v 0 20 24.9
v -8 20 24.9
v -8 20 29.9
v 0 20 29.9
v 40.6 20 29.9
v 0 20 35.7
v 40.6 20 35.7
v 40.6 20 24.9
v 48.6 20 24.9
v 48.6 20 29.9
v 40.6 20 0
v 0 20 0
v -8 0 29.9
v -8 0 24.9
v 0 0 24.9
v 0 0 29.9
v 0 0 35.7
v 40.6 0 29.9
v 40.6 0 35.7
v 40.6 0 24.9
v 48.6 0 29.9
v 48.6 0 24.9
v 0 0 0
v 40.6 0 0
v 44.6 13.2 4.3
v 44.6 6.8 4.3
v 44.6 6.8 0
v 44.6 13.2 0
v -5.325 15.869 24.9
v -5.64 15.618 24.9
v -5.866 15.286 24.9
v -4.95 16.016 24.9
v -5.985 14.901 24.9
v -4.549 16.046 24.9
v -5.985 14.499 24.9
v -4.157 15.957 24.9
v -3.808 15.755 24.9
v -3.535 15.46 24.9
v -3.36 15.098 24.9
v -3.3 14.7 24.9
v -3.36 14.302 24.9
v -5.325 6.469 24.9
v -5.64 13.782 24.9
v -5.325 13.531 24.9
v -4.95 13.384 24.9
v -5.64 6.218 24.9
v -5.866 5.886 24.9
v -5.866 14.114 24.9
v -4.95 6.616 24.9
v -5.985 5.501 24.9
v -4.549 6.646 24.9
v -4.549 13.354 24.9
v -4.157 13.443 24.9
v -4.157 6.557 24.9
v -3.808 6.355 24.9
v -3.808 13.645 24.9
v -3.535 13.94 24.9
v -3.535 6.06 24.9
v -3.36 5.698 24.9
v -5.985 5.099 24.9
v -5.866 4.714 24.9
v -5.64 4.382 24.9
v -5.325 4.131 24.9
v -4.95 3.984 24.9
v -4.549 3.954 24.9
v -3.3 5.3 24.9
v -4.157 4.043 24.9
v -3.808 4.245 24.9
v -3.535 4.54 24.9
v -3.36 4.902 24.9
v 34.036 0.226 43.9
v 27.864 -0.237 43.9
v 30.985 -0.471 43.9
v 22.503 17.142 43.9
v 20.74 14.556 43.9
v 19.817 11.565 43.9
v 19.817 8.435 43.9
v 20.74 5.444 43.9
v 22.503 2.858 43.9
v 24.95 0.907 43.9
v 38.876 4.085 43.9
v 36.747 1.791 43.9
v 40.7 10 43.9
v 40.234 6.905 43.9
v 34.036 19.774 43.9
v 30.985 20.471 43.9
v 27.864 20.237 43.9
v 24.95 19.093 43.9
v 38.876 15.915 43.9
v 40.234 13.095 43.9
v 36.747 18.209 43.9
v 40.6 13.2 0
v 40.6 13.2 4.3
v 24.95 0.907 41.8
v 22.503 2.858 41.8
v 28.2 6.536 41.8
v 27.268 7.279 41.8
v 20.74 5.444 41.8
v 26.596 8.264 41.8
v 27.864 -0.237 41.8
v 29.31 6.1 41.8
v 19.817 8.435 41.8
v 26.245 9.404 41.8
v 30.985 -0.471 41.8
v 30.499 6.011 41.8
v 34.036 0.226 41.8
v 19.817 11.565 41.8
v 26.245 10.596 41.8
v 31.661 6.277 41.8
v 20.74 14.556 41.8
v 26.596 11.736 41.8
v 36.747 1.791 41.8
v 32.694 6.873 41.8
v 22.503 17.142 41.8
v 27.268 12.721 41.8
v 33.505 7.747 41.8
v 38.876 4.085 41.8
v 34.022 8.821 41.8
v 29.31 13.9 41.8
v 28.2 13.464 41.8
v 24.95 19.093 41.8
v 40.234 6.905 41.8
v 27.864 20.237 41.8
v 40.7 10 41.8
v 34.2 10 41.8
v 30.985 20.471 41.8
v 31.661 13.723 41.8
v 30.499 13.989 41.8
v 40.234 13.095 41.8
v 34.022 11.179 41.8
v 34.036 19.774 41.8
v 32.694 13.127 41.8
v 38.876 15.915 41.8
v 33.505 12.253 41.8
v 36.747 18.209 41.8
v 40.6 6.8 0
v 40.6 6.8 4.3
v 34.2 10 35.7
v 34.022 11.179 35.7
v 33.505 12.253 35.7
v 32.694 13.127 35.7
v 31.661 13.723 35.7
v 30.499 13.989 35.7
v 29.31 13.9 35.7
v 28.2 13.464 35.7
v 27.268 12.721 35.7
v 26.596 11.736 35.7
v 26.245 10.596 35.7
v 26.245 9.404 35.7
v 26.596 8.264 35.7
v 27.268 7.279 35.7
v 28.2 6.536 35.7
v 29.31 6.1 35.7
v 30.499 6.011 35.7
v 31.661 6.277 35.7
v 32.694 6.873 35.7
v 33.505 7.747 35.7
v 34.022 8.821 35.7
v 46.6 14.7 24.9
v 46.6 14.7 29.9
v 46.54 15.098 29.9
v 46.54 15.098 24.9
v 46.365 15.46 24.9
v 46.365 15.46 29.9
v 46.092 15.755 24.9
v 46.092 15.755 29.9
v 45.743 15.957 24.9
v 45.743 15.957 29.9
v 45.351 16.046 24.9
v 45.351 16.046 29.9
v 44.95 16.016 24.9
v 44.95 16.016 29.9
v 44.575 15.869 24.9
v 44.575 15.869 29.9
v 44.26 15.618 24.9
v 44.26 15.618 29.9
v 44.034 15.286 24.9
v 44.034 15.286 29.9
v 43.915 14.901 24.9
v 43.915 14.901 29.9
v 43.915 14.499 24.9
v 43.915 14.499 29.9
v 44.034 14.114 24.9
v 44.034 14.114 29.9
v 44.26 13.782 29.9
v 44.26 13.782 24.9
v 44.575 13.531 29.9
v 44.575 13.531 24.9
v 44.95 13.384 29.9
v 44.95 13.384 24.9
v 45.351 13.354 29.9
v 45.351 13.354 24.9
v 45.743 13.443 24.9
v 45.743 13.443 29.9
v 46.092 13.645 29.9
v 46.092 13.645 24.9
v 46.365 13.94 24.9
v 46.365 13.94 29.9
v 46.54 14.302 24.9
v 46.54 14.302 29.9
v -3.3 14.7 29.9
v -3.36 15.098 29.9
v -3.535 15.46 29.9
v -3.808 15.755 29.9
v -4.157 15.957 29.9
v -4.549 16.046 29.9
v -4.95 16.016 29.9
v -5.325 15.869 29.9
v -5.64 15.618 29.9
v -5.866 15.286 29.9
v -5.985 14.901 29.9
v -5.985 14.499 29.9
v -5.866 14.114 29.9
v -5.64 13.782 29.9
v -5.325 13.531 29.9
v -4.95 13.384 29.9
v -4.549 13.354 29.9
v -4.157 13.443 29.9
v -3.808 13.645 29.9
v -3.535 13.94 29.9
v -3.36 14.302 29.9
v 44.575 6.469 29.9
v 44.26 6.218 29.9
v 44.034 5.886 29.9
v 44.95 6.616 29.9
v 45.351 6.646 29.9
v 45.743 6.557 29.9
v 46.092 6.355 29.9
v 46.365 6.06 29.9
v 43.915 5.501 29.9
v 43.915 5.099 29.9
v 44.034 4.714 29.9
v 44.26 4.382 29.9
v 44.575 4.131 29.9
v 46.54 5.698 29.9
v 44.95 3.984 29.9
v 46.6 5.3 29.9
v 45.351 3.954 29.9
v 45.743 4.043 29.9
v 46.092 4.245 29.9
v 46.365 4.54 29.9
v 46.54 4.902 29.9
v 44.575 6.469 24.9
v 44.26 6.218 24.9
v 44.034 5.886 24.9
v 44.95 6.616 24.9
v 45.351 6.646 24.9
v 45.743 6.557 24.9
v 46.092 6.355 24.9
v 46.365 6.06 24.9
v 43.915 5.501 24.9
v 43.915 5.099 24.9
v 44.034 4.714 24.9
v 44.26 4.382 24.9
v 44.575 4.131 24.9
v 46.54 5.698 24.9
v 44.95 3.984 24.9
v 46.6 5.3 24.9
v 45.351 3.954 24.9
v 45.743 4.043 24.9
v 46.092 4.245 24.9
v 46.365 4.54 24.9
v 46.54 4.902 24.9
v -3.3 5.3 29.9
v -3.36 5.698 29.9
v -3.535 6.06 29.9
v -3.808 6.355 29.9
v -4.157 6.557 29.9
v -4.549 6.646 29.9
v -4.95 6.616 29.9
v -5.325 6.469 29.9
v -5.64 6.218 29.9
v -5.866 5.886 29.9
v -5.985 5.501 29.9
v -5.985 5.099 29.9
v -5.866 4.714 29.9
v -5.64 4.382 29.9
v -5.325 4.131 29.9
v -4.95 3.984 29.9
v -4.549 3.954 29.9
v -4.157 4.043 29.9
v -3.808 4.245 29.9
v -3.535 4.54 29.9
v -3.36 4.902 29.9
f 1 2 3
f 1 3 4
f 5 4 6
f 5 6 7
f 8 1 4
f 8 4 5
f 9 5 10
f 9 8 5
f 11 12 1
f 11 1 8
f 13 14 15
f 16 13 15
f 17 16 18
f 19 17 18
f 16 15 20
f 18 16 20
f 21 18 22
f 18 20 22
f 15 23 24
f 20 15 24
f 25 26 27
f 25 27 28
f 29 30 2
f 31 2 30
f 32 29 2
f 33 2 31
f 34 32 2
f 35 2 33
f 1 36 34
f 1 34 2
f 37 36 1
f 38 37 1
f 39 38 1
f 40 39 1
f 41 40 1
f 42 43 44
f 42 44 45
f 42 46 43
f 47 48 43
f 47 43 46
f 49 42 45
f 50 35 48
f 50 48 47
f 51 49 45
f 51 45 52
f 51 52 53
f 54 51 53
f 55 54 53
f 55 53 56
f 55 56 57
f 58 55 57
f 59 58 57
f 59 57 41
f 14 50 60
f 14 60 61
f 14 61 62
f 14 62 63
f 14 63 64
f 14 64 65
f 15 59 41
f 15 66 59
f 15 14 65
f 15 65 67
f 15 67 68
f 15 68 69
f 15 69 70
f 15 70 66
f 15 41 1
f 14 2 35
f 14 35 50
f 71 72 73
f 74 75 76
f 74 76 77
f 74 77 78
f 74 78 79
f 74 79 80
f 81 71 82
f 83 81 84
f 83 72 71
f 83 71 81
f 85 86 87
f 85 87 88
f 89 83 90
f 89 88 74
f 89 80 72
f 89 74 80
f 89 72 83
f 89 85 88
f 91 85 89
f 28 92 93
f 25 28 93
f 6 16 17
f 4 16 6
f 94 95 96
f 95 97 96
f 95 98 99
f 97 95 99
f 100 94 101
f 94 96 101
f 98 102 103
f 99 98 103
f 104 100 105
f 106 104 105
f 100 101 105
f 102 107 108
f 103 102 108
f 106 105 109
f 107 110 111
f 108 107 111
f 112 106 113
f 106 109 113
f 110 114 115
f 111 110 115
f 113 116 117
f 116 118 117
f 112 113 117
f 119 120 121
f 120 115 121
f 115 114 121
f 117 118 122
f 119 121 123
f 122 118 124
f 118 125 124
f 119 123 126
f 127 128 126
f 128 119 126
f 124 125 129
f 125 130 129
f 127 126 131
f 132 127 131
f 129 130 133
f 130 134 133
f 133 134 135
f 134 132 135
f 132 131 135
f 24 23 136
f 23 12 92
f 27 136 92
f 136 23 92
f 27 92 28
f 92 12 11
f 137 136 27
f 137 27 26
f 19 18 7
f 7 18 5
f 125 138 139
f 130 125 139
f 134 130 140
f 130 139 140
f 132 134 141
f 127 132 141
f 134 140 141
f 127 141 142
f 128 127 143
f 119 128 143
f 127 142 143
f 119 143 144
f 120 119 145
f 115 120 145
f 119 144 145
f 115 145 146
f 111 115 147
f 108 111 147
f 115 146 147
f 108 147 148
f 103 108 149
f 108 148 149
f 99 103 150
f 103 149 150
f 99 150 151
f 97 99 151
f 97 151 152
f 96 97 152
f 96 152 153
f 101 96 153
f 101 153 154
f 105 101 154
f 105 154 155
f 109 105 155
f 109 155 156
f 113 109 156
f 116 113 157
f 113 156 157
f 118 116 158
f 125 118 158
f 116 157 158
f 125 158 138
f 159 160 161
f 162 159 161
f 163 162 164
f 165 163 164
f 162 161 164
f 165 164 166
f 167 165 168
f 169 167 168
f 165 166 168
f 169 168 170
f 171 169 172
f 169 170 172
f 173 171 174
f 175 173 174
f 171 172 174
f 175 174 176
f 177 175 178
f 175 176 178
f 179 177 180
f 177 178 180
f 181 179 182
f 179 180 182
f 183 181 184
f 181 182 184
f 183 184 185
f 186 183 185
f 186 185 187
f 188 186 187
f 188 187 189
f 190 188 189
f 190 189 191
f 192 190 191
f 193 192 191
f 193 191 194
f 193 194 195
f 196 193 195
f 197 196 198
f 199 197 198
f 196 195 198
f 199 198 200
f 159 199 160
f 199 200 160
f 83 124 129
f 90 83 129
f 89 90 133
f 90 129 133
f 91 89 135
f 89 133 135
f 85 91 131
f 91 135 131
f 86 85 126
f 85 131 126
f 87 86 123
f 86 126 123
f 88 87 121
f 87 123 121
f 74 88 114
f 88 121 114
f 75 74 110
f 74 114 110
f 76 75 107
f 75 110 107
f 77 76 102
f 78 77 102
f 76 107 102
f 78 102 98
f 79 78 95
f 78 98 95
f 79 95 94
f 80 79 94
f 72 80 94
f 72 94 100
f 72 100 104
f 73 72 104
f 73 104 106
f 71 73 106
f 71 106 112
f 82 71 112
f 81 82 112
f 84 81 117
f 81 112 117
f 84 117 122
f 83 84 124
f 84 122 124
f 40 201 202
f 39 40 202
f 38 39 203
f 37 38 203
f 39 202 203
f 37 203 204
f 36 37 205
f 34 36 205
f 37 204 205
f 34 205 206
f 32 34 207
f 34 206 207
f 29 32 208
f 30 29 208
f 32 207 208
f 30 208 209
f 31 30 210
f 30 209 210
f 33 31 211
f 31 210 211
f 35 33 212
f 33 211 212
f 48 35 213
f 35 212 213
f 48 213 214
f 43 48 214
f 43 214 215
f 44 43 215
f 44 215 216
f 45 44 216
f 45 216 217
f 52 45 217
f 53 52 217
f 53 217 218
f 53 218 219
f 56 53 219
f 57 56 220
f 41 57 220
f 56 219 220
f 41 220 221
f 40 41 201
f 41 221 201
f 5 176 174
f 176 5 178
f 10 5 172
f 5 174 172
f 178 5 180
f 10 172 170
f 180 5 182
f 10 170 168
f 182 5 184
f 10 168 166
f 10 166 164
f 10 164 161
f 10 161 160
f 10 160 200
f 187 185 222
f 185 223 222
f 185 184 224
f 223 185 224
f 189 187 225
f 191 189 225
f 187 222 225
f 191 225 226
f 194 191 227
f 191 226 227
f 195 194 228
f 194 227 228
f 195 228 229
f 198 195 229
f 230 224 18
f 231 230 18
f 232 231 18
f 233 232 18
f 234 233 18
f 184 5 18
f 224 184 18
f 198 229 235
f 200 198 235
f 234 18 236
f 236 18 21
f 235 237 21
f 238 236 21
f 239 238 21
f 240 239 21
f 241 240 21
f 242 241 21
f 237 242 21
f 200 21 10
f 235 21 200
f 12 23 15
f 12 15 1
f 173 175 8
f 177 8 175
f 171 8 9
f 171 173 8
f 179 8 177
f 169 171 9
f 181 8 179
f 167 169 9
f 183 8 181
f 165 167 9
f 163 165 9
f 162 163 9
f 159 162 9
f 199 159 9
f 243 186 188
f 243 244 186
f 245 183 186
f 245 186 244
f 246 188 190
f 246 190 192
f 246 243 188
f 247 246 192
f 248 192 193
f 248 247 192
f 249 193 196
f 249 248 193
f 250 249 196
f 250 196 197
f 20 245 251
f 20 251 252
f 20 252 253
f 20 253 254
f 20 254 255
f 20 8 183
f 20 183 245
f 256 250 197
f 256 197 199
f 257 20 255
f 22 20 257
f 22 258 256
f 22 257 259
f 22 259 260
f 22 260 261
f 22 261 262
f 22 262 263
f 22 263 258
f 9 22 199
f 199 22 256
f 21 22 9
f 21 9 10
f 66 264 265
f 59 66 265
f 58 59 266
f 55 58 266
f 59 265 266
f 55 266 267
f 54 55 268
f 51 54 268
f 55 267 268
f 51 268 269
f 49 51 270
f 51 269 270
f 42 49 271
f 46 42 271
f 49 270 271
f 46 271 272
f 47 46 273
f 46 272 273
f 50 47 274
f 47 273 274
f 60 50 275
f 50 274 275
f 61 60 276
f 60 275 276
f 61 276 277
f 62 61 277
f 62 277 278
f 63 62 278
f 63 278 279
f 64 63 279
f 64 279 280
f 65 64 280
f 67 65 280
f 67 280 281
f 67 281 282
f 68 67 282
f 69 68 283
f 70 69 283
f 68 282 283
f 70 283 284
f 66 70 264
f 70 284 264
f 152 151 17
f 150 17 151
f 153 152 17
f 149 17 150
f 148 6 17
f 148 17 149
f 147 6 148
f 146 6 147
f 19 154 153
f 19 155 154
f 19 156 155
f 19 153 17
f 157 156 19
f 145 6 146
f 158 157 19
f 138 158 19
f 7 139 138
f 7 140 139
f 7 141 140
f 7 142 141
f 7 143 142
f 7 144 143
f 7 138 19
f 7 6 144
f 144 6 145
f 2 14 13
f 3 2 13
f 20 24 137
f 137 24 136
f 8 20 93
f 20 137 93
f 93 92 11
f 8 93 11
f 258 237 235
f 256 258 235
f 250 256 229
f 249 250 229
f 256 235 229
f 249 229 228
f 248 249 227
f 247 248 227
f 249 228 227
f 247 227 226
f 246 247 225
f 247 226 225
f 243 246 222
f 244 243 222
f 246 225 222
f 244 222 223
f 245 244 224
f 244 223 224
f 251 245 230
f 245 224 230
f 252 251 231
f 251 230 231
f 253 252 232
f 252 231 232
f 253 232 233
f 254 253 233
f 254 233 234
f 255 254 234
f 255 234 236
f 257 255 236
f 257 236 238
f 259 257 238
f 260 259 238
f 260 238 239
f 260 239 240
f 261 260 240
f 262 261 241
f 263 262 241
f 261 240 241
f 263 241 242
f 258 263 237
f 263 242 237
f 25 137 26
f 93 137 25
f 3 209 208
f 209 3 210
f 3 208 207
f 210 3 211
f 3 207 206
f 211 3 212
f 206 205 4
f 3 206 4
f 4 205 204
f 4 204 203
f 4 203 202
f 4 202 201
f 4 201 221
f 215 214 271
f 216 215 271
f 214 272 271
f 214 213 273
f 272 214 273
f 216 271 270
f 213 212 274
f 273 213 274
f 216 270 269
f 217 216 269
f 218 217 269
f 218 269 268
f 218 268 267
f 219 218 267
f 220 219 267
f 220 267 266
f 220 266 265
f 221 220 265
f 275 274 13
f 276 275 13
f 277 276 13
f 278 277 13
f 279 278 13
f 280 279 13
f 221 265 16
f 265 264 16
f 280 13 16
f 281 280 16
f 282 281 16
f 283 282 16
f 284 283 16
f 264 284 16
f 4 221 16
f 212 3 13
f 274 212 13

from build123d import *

# Parameters (mm, degrees)
F0_W      = 40.6
F0_H      = 20
F1_DEPTH  = 35.7
F2_W      = 8
F2_H      = 5
F3_DEPTH  = 20
F4_R      = 4
F5_DEPTH  = 6.1
F6_R      = 10.5
F7_DEPTH  = 2.1
F8_W      = 6.4
F8_H      = 4.3
F9_DEPTH  = 4
F10_R     = 1.35
F11_DEPTH = 5


with BuildPart() as f1:
    # F0 (on Top) → F1 (new body)
    with BuildSketch(Plane.XY):
        with Locations((20.3, 10)):
            Rectangle(F0_W, F0_H)
    extrude(amount=F1_DEPTH)

    # F2 (on face) → F3 (join, through all)
    with BuildSketch(Plane.XZ):
        with Locations((44.6, 27.4)):
            Rectangle(F2_W, F2_H)
        with Locations((-4, 27.4)):
            Rectangle(F2_W, F2_H)
    extrude(amount=-F3_DEPTH)

    # F4 (on face) → F5 (join)
    with BuildSketch(Plane.XY.offset(35.7)):
        with Locations((30.2, 10)):
            Circle(F4_R)
    extrude(amount=F5_DEPTH)

    # F6 (on face) → F7 (join)
    with BuildSketch(Plane.XY.offset(41.8)):
        with Locations((30.2, 10)):
            Circle(F6_R)
    extrude(amount=F7_DEPTH)

    # F8 (on face) → F9 (join)
    with BuildSketch(Plane.YZ.offset(40.6)):
        with Locations((10, 2.15)):
            Rectangle(F8_W, F8_H)
    extrude(amount=F9_DEPTH)

    # F10 (on face) → F11 (cut, through all)
    with BuildSketch(Plane.XY.offset(29.9)):
        with Locations((-4.65, 14.7)):
            Circle(F10_R)
        with Locations((-4.65, 5.3)):
            Circle(F10_R)
        with Locations((45.25, 14.7)):
            Circle(F10_R)
        with Locations((45.25, 5.3)):
            Circle(F10_R)
    extrude(amount=-F11_DEPTH, mode=Mode.SUBTRACT)


solid = f1.part
